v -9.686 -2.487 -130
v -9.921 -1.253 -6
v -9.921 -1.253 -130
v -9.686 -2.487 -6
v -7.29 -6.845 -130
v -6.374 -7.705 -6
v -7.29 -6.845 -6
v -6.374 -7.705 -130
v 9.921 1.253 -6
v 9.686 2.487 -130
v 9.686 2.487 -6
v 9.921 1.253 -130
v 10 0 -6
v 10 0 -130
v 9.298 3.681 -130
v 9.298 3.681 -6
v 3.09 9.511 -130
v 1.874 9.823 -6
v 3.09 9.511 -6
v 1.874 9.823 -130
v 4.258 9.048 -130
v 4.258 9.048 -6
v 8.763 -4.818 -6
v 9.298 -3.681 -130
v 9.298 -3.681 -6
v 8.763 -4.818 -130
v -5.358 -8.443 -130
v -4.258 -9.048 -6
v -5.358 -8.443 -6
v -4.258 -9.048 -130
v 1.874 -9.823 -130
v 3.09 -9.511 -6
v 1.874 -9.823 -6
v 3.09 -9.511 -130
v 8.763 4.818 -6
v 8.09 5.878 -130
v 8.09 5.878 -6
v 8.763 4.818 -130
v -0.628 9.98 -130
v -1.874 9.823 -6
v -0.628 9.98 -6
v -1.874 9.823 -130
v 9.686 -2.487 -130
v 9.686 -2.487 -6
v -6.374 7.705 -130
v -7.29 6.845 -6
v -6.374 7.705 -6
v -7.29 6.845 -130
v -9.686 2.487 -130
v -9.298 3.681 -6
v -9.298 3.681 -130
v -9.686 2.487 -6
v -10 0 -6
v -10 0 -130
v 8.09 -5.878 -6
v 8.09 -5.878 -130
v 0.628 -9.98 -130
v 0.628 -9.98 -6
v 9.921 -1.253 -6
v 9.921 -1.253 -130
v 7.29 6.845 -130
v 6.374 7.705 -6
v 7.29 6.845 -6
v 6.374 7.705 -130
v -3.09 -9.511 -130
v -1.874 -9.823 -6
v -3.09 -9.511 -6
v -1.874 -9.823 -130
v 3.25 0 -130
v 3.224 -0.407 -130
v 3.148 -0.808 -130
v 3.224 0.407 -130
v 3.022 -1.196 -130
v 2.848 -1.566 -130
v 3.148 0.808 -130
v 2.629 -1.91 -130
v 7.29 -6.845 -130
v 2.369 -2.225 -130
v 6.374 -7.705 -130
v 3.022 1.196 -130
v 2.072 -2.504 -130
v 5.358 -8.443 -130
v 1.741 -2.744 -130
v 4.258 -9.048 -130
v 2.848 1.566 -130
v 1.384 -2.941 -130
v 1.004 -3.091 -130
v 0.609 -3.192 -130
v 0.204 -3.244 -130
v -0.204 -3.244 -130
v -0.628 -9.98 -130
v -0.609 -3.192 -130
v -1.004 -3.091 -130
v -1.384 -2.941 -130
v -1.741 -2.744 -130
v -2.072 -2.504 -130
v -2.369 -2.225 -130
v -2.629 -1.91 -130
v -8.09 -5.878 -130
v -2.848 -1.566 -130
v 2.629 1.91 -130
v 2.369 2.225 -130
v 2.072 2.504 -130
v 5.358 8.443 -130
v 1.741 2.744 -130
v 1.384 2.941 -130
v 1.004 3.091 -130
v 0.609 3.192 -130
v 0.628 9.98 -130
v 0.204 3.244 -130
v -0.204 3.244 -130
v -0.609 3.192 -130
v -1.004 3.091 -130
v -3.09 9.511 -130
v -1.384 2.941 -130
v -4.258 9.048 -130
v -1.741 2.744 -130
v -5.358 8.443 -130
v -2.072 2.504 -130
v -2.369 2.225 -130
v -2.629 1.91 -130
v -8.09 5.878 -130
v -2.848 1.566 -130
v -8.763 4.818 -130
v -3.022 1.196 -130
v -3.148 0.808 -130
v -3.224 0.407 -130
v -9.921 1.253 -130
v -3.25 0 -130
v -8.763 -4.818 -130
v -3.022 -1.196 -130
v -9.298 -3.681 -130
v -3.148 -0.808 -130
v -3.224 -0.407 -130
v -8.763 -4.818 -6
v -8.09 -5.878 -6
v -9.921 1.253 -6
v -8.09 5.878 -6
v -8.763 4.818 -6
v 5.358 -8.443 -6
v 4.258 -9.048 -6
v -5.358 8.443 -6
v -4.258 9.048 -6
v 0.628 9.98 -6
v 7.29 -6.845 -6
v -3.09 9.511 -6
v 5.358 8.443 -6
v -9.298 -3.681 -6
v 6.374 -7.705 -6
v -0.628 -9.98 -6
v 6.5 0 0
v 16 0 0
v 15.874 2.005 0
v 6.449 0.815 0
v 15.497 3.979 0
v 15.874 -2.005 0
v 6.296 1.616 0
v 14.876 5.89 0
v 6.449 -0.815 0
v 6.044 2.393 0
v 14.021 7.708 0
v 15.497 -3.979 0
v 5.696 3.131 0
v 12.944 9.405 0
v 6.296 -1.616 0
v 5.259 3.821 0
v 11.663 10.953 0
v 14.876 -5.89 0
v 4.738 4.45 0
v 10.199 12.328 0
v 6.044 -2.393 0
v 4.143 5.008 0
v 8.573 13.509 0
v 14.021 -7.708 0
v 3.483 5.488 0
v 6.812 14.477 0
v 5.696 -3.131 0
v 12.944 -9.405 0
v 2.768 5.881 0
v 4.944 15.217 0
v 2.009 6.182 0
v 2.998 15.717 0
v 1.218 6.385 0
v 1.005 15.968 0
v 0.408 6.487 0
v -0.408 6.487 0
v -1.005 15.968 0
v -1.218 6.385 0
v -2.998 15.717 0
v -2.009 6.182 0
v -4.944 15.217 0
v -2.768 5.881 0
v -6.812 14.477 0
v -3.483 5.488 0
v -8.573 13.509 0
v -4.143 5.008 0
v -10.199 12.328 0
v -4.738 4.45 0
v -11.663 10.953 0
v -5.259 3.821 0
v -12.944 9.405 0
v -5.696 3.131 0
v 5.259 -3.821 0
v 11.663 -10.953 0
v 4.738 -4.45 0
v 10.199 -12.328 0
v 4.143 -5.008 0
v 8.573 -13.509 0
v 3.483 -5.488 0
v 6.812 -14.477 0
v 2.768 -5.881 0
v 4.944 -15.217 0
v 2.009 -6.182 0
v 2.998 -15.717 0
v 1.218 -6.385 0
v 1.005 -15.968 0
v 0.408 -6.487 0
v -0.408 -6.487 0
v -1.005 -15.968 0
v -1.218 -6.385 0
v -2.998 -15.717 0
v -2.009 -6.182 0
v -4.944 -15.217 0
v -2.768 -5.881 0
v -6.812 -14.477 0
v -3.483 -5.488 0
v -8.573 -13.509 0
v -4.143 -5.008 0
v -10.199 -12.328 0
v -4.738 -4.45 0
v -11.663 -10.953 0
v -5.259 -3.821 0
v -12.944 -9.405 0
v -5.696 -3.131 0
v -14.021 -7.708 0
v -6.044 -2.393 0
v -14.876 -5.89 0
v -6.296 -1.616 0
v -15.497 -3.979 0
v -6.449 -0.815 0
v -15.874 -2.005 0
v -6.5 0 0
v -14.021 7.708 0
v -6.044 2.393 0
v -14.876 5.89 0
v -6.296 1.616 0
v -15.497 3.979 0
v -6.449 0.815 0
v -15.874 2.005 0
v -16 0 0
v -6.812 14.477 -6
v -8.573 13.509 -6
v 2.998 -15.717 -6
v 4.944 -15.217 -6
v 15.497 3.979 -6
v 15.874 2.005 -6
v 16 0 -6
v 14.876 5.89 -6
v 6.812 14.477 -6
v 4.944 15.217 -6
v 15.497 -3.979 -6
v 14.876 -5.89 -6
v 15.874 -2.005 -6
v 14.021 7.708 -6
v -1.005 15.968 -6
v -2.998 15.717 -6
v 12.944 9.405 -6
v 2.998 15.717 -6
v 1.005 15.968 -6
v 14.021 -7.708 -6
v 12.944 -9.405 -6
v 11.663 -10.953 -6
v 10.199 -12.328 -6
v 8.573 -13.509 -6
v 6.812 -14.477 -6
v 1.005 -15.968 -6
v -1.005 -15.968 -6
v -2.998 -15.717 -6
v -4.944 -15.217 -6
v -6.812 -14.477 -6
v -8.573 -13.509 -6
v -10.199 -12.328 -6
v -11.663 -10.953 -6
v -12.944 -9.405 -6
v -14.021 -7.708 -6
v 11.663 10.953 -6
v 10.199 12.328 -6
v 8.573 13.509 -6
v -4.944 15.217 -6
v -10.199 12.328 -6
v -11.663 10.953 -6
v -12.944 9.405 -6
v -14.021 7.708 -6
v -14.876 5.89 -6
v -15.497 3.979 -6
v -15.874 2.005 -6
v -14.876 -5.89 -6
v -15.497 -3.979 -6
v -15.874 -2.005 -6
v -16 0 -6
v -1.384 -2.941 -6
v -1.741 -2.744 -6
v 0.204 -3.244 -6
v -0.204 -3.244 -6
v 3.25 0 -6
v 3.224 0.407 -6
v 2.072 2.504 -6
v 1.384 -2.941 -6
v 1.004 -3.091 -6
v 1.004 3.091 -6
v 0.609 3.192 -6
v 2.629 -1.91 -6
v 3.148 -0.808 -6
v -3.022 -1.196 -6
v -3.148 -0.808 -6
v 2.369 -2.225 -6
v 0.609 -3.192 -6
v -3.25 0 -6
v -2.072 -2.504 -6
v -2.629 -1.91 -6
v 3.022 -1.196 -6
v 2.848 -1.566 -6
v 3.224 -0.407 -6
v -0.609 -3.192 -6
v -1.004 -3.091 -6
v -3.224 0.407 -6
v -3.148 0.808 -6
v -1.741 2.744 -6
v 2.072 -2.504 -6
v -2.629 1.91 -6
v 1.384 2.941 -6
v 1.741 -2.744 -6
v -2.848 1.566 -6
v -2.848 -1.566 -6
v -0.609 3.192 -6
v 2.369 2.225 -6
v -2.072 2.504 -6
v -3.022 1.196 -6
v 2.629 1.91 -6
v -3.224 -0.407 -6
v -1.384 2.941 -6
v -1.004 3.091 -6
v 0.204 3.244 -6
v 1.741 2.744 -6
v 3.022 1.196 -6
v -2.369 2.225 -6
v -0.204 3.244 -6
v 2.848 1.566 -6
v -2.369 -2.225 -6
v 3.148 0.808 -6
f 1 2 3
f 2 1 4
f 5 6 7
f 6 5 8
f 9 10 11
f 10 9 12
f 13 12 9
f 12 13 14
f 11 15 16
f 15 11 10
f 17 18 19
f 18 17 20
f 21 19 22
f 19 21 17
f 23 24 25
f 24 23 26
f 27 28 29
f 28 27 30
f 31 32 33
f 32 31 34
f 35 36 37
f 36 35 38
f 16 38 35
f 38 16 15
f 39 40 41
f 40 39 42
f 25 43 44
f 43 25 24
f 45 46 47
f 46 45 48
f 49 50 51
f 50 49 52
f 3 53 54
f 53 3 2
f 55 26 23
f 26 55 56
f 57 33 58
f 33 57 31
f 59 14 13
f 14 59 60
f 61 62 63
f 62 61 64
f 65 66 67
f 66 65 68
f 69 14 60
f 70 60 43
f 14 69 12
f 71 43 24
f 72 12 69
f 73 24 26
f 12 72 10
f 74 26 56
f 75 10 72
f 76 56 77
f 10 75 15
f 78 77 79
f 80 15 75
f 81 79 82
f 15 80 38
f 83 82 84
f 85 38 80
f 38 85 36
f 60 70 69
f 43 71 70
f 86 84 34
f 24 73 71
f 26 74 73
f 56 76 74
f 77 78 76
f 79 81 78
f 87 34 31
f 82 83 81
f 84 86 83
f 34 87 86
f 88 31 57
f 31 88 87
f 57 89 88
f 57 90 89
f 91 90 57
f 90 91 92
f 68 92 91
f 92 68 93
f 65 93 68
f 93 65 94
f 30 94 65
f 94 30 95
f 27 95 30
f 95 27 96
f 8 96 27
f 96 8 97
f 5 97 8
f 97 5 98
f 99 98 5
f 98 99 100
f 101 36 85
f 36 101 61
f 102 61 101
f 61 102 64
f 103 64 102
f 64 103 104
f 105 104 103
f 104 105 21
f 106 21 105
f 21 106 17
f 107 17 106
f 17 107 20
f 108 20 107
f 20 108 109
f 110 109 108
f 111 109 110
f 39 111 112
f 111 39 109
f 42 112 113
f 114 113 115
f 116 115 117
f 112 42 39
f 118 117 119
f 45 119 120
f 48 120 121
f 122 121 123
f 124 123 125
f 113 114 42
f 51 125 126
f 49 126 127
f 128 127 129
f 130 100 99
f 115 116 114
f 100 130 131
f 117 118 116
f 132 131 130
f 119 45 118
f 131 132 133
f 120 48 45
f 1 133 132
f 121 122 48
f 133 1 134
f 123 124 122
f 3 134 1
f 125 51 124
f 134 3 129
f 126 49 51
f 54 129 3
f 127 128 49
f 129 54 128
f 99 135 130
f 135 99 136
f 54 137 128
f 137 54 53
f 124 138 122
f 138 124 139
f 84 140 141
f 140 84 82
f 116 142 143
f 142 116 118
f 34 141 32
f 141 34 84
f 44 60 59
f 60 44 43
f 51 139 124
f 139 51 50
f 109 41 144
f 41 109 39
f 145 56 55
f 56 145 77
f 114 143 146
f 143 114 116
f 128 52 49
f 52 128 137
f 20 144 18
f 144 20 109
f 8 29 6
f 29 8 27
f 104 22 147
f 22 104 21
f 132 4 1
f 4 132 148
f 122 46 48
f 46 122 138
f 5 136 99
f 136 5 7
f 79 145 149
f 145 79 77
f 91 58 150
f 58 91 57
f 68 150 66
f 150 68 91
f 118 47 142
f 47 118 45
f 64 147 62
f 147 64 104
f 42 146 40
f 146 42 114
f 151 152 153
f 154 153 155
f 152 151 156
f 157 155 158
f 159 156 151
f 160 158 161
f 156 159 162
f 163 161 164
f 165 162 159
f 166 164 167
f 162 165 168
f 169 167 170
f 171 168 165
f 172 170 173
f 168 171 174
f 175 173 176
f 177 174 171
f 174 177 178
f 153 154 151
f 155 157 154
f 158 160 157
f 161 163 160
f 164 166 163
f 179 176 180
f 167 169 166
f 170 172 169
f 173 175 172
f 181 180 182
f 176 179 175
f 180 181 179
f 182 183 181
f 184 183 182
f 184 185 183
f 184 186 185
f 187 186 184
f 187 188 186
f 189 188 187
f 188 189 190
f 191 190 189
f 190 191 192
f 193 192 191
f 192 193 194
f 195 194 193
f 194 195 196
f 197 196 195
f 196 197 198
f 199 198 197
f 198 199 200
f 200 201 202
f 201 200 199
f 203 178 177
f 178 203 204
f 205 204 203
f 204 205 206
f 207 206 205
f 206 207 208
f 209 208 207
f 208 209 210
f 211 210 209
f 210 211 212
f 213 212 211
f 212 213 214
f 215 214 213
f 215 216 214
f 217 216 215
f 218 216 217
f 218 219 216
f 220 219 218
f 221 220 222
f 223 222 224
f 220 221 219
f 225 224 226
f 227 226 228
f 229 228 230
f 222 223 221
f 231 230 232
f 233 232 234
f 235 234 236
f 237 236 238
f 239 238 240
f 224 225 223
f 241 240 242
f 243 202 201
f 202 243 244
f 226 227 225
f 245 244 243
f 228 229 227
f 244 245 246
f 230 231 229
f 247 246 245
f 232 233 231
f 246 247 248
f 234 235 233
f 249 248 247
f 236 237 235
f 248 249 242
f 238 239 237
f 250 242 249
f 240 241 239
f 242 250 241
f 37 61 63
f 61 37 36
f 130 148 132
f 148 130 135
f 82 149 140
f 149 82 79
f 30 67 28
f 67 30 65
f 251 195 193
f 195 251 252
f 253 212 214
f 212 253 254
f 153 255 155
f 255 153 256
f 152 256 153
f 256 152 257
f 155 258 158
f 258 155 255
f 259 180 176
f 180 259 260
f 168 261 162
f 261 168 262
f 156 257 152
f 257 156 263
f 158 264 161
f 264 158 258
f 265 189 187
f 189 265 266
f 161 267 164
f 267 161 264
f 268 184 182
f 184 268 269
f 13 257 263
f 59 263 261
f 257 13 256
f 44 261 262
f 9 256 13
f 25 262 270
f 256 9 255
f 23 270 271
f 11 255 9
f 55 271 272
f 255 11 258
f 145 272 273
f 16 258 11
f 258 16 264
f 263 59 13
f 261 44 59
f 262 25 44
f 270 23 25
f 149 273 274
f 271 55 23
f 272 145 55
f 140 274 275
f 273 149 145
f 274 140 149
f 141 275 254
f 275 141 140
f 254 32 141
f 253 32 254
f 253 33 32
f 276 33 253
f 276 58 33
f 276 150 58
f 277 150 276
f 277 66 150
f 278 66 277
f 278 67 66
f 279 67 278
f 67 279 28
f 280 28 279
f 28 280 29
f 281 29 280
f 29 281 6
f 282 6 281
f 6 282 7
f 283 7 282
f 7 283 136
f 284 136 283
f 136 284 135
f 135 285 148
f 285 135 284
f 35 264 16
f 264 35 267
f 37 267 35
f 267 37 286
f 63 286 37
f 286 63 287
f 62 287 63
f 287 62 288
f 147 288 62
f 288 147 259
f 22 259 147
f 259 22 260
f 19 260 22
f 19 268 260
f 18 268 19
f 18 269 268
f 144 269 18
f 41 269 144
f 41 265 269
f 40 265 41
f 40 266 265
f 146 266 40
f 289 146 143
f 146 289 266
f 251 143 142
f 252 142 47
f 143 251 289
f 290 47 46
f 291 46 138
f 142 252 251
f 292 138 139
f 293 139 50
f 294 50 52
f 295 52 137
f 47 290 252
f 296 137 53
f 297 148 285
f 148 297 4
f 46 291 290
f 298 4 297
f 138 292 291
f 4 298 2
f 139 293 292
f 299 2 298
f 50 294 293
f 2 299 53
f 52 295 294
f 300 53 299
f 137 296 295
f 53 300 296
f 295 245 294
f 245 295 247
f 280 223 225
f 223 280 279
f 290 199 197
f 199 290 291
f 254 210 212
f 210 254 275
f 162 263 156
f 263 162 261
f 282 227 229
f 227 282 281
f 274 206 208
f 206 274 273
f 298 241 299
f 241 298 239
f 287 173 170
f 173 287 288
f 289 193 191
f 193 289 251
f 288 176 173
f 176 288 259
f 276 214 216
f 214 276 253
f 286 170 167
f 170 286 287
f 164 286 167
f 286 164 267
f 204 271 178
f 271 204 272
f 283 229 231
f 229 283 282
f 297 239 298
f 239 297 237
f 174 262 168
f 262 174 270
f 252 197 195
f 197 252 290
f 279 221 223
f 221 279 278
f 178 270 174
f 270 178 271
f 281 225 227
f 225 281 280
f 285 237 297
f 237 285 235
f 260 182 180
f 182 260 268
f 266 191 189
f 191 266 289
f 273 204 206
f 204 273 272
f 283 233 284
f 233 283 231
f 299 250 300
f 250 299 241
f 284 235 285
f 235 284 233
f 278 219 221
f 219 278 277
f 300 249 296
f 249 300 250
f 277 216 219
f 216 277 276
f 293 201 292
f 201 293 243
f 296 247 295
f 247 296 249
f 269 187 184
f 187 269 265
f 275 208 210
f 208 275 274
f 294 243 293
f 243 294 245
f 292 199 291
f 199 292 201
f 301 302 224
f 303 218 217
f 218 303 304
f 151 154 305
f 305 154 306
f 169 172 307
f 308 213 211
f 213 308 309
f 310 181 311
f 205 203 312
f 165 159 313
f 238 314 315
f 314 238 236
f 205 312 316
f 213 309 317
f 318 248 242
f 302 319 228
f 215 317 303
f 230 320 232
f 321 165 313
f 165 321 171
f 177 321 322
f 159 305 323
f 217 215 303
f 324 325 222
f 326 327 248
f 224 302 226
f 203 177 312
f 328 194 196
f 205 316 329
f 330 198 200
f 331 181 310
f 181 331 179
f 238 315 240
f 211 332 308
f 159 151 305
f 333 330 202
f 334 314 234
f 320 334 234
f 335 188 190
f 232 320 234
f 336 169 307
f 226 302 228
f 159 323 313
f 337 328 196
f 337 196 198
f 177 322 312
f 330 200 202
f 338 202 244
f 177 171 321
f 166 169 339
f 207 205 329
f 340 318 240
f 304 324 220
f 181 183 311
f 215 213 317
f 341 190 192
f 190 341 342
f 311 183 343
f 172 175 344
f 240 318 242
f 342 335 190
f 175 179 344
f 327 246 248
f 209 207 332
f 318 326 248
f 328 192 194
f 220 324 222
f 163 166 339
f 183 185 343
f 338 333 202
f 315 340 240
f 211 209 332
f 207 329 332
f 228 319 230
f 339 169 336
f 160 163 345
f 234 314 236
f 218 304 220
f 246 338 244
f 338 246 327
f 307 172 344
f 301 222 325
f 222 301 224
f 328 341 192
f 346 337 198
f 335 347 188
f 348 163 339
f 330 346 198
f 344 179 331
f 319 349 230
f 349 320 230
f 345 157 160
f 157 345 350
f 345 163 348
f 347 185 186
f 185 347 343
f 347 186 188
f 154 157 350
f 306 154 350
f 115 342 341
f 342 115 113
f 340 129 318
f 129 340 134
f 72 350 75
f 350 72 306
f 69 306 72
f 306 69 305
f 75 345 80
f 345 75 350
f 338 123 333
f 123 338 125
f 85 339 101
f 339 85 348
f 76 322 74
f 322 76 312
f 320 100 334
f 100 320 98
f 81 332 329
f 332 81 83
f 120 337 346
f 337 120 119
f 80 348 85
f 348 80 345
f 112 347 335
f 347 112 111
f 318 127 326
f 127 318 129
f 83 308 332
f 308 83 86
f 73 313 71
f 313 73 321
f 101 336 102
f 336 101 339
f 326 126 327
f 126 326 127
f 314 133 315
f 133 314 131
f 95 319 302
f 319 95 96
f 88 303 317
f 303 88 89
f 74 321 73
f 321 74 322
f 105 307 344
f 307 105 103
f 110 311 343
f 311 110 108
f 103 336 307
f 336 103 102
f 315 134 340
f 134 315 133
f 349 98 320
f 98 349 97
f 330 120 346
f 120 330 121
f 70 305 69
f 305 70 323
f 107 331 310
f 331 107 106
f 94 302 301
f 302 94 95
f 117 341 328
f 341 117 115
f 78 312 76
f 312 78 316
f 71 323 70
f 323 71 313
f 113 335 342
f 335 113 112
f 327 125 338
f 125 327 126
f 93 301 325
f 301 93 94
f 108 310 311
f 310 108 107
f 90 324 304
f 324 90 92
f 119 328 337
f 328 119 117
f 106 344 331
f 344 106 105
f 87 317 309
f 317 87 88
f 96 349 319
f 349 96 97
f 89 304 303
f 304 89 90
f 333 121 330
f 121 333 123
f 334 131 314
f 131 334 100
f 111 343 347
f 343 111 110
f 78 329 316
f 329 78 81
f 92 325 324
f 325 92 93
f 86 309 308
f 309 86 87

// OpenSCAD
$fn = 50;


difference() {
	union() {
		translate(v = [0, 0, -130.0000000000]) {
			cylinder(h = 130, r = 10.0000000000);
		}
		translate(v = [0, 0, -6.0000000000]) {
			cylinder(h = 6, r = 16.0000000000);
		}
	}
	union() {
		translate(v = [0, 0, 0]) {
			rotate(a = [0, 0, 0]) {
				difference() {
					union() {
						#translate(v = [0, 0, -130.0000000000]) {
							cylinder(h = 130, r = 2.2500000000);
						}
						#translate(v = [0, 0, -6]) {
							cylinder(h = 6, r = 10.0000000000, r1 = 3.2500000000, r2 = 6.5000000000);
						}
						#translate(v = [0, 0, -130.0000000000]) {
							cylinder(h = 130, r = 3.2500000000);
						}
						#translate(v = [0, 0, -130.0000000000]) {
							cylinder(h = 130, r = 2.2500000000);
						}
					}
					union();
				}
			}
		}
	}
}
